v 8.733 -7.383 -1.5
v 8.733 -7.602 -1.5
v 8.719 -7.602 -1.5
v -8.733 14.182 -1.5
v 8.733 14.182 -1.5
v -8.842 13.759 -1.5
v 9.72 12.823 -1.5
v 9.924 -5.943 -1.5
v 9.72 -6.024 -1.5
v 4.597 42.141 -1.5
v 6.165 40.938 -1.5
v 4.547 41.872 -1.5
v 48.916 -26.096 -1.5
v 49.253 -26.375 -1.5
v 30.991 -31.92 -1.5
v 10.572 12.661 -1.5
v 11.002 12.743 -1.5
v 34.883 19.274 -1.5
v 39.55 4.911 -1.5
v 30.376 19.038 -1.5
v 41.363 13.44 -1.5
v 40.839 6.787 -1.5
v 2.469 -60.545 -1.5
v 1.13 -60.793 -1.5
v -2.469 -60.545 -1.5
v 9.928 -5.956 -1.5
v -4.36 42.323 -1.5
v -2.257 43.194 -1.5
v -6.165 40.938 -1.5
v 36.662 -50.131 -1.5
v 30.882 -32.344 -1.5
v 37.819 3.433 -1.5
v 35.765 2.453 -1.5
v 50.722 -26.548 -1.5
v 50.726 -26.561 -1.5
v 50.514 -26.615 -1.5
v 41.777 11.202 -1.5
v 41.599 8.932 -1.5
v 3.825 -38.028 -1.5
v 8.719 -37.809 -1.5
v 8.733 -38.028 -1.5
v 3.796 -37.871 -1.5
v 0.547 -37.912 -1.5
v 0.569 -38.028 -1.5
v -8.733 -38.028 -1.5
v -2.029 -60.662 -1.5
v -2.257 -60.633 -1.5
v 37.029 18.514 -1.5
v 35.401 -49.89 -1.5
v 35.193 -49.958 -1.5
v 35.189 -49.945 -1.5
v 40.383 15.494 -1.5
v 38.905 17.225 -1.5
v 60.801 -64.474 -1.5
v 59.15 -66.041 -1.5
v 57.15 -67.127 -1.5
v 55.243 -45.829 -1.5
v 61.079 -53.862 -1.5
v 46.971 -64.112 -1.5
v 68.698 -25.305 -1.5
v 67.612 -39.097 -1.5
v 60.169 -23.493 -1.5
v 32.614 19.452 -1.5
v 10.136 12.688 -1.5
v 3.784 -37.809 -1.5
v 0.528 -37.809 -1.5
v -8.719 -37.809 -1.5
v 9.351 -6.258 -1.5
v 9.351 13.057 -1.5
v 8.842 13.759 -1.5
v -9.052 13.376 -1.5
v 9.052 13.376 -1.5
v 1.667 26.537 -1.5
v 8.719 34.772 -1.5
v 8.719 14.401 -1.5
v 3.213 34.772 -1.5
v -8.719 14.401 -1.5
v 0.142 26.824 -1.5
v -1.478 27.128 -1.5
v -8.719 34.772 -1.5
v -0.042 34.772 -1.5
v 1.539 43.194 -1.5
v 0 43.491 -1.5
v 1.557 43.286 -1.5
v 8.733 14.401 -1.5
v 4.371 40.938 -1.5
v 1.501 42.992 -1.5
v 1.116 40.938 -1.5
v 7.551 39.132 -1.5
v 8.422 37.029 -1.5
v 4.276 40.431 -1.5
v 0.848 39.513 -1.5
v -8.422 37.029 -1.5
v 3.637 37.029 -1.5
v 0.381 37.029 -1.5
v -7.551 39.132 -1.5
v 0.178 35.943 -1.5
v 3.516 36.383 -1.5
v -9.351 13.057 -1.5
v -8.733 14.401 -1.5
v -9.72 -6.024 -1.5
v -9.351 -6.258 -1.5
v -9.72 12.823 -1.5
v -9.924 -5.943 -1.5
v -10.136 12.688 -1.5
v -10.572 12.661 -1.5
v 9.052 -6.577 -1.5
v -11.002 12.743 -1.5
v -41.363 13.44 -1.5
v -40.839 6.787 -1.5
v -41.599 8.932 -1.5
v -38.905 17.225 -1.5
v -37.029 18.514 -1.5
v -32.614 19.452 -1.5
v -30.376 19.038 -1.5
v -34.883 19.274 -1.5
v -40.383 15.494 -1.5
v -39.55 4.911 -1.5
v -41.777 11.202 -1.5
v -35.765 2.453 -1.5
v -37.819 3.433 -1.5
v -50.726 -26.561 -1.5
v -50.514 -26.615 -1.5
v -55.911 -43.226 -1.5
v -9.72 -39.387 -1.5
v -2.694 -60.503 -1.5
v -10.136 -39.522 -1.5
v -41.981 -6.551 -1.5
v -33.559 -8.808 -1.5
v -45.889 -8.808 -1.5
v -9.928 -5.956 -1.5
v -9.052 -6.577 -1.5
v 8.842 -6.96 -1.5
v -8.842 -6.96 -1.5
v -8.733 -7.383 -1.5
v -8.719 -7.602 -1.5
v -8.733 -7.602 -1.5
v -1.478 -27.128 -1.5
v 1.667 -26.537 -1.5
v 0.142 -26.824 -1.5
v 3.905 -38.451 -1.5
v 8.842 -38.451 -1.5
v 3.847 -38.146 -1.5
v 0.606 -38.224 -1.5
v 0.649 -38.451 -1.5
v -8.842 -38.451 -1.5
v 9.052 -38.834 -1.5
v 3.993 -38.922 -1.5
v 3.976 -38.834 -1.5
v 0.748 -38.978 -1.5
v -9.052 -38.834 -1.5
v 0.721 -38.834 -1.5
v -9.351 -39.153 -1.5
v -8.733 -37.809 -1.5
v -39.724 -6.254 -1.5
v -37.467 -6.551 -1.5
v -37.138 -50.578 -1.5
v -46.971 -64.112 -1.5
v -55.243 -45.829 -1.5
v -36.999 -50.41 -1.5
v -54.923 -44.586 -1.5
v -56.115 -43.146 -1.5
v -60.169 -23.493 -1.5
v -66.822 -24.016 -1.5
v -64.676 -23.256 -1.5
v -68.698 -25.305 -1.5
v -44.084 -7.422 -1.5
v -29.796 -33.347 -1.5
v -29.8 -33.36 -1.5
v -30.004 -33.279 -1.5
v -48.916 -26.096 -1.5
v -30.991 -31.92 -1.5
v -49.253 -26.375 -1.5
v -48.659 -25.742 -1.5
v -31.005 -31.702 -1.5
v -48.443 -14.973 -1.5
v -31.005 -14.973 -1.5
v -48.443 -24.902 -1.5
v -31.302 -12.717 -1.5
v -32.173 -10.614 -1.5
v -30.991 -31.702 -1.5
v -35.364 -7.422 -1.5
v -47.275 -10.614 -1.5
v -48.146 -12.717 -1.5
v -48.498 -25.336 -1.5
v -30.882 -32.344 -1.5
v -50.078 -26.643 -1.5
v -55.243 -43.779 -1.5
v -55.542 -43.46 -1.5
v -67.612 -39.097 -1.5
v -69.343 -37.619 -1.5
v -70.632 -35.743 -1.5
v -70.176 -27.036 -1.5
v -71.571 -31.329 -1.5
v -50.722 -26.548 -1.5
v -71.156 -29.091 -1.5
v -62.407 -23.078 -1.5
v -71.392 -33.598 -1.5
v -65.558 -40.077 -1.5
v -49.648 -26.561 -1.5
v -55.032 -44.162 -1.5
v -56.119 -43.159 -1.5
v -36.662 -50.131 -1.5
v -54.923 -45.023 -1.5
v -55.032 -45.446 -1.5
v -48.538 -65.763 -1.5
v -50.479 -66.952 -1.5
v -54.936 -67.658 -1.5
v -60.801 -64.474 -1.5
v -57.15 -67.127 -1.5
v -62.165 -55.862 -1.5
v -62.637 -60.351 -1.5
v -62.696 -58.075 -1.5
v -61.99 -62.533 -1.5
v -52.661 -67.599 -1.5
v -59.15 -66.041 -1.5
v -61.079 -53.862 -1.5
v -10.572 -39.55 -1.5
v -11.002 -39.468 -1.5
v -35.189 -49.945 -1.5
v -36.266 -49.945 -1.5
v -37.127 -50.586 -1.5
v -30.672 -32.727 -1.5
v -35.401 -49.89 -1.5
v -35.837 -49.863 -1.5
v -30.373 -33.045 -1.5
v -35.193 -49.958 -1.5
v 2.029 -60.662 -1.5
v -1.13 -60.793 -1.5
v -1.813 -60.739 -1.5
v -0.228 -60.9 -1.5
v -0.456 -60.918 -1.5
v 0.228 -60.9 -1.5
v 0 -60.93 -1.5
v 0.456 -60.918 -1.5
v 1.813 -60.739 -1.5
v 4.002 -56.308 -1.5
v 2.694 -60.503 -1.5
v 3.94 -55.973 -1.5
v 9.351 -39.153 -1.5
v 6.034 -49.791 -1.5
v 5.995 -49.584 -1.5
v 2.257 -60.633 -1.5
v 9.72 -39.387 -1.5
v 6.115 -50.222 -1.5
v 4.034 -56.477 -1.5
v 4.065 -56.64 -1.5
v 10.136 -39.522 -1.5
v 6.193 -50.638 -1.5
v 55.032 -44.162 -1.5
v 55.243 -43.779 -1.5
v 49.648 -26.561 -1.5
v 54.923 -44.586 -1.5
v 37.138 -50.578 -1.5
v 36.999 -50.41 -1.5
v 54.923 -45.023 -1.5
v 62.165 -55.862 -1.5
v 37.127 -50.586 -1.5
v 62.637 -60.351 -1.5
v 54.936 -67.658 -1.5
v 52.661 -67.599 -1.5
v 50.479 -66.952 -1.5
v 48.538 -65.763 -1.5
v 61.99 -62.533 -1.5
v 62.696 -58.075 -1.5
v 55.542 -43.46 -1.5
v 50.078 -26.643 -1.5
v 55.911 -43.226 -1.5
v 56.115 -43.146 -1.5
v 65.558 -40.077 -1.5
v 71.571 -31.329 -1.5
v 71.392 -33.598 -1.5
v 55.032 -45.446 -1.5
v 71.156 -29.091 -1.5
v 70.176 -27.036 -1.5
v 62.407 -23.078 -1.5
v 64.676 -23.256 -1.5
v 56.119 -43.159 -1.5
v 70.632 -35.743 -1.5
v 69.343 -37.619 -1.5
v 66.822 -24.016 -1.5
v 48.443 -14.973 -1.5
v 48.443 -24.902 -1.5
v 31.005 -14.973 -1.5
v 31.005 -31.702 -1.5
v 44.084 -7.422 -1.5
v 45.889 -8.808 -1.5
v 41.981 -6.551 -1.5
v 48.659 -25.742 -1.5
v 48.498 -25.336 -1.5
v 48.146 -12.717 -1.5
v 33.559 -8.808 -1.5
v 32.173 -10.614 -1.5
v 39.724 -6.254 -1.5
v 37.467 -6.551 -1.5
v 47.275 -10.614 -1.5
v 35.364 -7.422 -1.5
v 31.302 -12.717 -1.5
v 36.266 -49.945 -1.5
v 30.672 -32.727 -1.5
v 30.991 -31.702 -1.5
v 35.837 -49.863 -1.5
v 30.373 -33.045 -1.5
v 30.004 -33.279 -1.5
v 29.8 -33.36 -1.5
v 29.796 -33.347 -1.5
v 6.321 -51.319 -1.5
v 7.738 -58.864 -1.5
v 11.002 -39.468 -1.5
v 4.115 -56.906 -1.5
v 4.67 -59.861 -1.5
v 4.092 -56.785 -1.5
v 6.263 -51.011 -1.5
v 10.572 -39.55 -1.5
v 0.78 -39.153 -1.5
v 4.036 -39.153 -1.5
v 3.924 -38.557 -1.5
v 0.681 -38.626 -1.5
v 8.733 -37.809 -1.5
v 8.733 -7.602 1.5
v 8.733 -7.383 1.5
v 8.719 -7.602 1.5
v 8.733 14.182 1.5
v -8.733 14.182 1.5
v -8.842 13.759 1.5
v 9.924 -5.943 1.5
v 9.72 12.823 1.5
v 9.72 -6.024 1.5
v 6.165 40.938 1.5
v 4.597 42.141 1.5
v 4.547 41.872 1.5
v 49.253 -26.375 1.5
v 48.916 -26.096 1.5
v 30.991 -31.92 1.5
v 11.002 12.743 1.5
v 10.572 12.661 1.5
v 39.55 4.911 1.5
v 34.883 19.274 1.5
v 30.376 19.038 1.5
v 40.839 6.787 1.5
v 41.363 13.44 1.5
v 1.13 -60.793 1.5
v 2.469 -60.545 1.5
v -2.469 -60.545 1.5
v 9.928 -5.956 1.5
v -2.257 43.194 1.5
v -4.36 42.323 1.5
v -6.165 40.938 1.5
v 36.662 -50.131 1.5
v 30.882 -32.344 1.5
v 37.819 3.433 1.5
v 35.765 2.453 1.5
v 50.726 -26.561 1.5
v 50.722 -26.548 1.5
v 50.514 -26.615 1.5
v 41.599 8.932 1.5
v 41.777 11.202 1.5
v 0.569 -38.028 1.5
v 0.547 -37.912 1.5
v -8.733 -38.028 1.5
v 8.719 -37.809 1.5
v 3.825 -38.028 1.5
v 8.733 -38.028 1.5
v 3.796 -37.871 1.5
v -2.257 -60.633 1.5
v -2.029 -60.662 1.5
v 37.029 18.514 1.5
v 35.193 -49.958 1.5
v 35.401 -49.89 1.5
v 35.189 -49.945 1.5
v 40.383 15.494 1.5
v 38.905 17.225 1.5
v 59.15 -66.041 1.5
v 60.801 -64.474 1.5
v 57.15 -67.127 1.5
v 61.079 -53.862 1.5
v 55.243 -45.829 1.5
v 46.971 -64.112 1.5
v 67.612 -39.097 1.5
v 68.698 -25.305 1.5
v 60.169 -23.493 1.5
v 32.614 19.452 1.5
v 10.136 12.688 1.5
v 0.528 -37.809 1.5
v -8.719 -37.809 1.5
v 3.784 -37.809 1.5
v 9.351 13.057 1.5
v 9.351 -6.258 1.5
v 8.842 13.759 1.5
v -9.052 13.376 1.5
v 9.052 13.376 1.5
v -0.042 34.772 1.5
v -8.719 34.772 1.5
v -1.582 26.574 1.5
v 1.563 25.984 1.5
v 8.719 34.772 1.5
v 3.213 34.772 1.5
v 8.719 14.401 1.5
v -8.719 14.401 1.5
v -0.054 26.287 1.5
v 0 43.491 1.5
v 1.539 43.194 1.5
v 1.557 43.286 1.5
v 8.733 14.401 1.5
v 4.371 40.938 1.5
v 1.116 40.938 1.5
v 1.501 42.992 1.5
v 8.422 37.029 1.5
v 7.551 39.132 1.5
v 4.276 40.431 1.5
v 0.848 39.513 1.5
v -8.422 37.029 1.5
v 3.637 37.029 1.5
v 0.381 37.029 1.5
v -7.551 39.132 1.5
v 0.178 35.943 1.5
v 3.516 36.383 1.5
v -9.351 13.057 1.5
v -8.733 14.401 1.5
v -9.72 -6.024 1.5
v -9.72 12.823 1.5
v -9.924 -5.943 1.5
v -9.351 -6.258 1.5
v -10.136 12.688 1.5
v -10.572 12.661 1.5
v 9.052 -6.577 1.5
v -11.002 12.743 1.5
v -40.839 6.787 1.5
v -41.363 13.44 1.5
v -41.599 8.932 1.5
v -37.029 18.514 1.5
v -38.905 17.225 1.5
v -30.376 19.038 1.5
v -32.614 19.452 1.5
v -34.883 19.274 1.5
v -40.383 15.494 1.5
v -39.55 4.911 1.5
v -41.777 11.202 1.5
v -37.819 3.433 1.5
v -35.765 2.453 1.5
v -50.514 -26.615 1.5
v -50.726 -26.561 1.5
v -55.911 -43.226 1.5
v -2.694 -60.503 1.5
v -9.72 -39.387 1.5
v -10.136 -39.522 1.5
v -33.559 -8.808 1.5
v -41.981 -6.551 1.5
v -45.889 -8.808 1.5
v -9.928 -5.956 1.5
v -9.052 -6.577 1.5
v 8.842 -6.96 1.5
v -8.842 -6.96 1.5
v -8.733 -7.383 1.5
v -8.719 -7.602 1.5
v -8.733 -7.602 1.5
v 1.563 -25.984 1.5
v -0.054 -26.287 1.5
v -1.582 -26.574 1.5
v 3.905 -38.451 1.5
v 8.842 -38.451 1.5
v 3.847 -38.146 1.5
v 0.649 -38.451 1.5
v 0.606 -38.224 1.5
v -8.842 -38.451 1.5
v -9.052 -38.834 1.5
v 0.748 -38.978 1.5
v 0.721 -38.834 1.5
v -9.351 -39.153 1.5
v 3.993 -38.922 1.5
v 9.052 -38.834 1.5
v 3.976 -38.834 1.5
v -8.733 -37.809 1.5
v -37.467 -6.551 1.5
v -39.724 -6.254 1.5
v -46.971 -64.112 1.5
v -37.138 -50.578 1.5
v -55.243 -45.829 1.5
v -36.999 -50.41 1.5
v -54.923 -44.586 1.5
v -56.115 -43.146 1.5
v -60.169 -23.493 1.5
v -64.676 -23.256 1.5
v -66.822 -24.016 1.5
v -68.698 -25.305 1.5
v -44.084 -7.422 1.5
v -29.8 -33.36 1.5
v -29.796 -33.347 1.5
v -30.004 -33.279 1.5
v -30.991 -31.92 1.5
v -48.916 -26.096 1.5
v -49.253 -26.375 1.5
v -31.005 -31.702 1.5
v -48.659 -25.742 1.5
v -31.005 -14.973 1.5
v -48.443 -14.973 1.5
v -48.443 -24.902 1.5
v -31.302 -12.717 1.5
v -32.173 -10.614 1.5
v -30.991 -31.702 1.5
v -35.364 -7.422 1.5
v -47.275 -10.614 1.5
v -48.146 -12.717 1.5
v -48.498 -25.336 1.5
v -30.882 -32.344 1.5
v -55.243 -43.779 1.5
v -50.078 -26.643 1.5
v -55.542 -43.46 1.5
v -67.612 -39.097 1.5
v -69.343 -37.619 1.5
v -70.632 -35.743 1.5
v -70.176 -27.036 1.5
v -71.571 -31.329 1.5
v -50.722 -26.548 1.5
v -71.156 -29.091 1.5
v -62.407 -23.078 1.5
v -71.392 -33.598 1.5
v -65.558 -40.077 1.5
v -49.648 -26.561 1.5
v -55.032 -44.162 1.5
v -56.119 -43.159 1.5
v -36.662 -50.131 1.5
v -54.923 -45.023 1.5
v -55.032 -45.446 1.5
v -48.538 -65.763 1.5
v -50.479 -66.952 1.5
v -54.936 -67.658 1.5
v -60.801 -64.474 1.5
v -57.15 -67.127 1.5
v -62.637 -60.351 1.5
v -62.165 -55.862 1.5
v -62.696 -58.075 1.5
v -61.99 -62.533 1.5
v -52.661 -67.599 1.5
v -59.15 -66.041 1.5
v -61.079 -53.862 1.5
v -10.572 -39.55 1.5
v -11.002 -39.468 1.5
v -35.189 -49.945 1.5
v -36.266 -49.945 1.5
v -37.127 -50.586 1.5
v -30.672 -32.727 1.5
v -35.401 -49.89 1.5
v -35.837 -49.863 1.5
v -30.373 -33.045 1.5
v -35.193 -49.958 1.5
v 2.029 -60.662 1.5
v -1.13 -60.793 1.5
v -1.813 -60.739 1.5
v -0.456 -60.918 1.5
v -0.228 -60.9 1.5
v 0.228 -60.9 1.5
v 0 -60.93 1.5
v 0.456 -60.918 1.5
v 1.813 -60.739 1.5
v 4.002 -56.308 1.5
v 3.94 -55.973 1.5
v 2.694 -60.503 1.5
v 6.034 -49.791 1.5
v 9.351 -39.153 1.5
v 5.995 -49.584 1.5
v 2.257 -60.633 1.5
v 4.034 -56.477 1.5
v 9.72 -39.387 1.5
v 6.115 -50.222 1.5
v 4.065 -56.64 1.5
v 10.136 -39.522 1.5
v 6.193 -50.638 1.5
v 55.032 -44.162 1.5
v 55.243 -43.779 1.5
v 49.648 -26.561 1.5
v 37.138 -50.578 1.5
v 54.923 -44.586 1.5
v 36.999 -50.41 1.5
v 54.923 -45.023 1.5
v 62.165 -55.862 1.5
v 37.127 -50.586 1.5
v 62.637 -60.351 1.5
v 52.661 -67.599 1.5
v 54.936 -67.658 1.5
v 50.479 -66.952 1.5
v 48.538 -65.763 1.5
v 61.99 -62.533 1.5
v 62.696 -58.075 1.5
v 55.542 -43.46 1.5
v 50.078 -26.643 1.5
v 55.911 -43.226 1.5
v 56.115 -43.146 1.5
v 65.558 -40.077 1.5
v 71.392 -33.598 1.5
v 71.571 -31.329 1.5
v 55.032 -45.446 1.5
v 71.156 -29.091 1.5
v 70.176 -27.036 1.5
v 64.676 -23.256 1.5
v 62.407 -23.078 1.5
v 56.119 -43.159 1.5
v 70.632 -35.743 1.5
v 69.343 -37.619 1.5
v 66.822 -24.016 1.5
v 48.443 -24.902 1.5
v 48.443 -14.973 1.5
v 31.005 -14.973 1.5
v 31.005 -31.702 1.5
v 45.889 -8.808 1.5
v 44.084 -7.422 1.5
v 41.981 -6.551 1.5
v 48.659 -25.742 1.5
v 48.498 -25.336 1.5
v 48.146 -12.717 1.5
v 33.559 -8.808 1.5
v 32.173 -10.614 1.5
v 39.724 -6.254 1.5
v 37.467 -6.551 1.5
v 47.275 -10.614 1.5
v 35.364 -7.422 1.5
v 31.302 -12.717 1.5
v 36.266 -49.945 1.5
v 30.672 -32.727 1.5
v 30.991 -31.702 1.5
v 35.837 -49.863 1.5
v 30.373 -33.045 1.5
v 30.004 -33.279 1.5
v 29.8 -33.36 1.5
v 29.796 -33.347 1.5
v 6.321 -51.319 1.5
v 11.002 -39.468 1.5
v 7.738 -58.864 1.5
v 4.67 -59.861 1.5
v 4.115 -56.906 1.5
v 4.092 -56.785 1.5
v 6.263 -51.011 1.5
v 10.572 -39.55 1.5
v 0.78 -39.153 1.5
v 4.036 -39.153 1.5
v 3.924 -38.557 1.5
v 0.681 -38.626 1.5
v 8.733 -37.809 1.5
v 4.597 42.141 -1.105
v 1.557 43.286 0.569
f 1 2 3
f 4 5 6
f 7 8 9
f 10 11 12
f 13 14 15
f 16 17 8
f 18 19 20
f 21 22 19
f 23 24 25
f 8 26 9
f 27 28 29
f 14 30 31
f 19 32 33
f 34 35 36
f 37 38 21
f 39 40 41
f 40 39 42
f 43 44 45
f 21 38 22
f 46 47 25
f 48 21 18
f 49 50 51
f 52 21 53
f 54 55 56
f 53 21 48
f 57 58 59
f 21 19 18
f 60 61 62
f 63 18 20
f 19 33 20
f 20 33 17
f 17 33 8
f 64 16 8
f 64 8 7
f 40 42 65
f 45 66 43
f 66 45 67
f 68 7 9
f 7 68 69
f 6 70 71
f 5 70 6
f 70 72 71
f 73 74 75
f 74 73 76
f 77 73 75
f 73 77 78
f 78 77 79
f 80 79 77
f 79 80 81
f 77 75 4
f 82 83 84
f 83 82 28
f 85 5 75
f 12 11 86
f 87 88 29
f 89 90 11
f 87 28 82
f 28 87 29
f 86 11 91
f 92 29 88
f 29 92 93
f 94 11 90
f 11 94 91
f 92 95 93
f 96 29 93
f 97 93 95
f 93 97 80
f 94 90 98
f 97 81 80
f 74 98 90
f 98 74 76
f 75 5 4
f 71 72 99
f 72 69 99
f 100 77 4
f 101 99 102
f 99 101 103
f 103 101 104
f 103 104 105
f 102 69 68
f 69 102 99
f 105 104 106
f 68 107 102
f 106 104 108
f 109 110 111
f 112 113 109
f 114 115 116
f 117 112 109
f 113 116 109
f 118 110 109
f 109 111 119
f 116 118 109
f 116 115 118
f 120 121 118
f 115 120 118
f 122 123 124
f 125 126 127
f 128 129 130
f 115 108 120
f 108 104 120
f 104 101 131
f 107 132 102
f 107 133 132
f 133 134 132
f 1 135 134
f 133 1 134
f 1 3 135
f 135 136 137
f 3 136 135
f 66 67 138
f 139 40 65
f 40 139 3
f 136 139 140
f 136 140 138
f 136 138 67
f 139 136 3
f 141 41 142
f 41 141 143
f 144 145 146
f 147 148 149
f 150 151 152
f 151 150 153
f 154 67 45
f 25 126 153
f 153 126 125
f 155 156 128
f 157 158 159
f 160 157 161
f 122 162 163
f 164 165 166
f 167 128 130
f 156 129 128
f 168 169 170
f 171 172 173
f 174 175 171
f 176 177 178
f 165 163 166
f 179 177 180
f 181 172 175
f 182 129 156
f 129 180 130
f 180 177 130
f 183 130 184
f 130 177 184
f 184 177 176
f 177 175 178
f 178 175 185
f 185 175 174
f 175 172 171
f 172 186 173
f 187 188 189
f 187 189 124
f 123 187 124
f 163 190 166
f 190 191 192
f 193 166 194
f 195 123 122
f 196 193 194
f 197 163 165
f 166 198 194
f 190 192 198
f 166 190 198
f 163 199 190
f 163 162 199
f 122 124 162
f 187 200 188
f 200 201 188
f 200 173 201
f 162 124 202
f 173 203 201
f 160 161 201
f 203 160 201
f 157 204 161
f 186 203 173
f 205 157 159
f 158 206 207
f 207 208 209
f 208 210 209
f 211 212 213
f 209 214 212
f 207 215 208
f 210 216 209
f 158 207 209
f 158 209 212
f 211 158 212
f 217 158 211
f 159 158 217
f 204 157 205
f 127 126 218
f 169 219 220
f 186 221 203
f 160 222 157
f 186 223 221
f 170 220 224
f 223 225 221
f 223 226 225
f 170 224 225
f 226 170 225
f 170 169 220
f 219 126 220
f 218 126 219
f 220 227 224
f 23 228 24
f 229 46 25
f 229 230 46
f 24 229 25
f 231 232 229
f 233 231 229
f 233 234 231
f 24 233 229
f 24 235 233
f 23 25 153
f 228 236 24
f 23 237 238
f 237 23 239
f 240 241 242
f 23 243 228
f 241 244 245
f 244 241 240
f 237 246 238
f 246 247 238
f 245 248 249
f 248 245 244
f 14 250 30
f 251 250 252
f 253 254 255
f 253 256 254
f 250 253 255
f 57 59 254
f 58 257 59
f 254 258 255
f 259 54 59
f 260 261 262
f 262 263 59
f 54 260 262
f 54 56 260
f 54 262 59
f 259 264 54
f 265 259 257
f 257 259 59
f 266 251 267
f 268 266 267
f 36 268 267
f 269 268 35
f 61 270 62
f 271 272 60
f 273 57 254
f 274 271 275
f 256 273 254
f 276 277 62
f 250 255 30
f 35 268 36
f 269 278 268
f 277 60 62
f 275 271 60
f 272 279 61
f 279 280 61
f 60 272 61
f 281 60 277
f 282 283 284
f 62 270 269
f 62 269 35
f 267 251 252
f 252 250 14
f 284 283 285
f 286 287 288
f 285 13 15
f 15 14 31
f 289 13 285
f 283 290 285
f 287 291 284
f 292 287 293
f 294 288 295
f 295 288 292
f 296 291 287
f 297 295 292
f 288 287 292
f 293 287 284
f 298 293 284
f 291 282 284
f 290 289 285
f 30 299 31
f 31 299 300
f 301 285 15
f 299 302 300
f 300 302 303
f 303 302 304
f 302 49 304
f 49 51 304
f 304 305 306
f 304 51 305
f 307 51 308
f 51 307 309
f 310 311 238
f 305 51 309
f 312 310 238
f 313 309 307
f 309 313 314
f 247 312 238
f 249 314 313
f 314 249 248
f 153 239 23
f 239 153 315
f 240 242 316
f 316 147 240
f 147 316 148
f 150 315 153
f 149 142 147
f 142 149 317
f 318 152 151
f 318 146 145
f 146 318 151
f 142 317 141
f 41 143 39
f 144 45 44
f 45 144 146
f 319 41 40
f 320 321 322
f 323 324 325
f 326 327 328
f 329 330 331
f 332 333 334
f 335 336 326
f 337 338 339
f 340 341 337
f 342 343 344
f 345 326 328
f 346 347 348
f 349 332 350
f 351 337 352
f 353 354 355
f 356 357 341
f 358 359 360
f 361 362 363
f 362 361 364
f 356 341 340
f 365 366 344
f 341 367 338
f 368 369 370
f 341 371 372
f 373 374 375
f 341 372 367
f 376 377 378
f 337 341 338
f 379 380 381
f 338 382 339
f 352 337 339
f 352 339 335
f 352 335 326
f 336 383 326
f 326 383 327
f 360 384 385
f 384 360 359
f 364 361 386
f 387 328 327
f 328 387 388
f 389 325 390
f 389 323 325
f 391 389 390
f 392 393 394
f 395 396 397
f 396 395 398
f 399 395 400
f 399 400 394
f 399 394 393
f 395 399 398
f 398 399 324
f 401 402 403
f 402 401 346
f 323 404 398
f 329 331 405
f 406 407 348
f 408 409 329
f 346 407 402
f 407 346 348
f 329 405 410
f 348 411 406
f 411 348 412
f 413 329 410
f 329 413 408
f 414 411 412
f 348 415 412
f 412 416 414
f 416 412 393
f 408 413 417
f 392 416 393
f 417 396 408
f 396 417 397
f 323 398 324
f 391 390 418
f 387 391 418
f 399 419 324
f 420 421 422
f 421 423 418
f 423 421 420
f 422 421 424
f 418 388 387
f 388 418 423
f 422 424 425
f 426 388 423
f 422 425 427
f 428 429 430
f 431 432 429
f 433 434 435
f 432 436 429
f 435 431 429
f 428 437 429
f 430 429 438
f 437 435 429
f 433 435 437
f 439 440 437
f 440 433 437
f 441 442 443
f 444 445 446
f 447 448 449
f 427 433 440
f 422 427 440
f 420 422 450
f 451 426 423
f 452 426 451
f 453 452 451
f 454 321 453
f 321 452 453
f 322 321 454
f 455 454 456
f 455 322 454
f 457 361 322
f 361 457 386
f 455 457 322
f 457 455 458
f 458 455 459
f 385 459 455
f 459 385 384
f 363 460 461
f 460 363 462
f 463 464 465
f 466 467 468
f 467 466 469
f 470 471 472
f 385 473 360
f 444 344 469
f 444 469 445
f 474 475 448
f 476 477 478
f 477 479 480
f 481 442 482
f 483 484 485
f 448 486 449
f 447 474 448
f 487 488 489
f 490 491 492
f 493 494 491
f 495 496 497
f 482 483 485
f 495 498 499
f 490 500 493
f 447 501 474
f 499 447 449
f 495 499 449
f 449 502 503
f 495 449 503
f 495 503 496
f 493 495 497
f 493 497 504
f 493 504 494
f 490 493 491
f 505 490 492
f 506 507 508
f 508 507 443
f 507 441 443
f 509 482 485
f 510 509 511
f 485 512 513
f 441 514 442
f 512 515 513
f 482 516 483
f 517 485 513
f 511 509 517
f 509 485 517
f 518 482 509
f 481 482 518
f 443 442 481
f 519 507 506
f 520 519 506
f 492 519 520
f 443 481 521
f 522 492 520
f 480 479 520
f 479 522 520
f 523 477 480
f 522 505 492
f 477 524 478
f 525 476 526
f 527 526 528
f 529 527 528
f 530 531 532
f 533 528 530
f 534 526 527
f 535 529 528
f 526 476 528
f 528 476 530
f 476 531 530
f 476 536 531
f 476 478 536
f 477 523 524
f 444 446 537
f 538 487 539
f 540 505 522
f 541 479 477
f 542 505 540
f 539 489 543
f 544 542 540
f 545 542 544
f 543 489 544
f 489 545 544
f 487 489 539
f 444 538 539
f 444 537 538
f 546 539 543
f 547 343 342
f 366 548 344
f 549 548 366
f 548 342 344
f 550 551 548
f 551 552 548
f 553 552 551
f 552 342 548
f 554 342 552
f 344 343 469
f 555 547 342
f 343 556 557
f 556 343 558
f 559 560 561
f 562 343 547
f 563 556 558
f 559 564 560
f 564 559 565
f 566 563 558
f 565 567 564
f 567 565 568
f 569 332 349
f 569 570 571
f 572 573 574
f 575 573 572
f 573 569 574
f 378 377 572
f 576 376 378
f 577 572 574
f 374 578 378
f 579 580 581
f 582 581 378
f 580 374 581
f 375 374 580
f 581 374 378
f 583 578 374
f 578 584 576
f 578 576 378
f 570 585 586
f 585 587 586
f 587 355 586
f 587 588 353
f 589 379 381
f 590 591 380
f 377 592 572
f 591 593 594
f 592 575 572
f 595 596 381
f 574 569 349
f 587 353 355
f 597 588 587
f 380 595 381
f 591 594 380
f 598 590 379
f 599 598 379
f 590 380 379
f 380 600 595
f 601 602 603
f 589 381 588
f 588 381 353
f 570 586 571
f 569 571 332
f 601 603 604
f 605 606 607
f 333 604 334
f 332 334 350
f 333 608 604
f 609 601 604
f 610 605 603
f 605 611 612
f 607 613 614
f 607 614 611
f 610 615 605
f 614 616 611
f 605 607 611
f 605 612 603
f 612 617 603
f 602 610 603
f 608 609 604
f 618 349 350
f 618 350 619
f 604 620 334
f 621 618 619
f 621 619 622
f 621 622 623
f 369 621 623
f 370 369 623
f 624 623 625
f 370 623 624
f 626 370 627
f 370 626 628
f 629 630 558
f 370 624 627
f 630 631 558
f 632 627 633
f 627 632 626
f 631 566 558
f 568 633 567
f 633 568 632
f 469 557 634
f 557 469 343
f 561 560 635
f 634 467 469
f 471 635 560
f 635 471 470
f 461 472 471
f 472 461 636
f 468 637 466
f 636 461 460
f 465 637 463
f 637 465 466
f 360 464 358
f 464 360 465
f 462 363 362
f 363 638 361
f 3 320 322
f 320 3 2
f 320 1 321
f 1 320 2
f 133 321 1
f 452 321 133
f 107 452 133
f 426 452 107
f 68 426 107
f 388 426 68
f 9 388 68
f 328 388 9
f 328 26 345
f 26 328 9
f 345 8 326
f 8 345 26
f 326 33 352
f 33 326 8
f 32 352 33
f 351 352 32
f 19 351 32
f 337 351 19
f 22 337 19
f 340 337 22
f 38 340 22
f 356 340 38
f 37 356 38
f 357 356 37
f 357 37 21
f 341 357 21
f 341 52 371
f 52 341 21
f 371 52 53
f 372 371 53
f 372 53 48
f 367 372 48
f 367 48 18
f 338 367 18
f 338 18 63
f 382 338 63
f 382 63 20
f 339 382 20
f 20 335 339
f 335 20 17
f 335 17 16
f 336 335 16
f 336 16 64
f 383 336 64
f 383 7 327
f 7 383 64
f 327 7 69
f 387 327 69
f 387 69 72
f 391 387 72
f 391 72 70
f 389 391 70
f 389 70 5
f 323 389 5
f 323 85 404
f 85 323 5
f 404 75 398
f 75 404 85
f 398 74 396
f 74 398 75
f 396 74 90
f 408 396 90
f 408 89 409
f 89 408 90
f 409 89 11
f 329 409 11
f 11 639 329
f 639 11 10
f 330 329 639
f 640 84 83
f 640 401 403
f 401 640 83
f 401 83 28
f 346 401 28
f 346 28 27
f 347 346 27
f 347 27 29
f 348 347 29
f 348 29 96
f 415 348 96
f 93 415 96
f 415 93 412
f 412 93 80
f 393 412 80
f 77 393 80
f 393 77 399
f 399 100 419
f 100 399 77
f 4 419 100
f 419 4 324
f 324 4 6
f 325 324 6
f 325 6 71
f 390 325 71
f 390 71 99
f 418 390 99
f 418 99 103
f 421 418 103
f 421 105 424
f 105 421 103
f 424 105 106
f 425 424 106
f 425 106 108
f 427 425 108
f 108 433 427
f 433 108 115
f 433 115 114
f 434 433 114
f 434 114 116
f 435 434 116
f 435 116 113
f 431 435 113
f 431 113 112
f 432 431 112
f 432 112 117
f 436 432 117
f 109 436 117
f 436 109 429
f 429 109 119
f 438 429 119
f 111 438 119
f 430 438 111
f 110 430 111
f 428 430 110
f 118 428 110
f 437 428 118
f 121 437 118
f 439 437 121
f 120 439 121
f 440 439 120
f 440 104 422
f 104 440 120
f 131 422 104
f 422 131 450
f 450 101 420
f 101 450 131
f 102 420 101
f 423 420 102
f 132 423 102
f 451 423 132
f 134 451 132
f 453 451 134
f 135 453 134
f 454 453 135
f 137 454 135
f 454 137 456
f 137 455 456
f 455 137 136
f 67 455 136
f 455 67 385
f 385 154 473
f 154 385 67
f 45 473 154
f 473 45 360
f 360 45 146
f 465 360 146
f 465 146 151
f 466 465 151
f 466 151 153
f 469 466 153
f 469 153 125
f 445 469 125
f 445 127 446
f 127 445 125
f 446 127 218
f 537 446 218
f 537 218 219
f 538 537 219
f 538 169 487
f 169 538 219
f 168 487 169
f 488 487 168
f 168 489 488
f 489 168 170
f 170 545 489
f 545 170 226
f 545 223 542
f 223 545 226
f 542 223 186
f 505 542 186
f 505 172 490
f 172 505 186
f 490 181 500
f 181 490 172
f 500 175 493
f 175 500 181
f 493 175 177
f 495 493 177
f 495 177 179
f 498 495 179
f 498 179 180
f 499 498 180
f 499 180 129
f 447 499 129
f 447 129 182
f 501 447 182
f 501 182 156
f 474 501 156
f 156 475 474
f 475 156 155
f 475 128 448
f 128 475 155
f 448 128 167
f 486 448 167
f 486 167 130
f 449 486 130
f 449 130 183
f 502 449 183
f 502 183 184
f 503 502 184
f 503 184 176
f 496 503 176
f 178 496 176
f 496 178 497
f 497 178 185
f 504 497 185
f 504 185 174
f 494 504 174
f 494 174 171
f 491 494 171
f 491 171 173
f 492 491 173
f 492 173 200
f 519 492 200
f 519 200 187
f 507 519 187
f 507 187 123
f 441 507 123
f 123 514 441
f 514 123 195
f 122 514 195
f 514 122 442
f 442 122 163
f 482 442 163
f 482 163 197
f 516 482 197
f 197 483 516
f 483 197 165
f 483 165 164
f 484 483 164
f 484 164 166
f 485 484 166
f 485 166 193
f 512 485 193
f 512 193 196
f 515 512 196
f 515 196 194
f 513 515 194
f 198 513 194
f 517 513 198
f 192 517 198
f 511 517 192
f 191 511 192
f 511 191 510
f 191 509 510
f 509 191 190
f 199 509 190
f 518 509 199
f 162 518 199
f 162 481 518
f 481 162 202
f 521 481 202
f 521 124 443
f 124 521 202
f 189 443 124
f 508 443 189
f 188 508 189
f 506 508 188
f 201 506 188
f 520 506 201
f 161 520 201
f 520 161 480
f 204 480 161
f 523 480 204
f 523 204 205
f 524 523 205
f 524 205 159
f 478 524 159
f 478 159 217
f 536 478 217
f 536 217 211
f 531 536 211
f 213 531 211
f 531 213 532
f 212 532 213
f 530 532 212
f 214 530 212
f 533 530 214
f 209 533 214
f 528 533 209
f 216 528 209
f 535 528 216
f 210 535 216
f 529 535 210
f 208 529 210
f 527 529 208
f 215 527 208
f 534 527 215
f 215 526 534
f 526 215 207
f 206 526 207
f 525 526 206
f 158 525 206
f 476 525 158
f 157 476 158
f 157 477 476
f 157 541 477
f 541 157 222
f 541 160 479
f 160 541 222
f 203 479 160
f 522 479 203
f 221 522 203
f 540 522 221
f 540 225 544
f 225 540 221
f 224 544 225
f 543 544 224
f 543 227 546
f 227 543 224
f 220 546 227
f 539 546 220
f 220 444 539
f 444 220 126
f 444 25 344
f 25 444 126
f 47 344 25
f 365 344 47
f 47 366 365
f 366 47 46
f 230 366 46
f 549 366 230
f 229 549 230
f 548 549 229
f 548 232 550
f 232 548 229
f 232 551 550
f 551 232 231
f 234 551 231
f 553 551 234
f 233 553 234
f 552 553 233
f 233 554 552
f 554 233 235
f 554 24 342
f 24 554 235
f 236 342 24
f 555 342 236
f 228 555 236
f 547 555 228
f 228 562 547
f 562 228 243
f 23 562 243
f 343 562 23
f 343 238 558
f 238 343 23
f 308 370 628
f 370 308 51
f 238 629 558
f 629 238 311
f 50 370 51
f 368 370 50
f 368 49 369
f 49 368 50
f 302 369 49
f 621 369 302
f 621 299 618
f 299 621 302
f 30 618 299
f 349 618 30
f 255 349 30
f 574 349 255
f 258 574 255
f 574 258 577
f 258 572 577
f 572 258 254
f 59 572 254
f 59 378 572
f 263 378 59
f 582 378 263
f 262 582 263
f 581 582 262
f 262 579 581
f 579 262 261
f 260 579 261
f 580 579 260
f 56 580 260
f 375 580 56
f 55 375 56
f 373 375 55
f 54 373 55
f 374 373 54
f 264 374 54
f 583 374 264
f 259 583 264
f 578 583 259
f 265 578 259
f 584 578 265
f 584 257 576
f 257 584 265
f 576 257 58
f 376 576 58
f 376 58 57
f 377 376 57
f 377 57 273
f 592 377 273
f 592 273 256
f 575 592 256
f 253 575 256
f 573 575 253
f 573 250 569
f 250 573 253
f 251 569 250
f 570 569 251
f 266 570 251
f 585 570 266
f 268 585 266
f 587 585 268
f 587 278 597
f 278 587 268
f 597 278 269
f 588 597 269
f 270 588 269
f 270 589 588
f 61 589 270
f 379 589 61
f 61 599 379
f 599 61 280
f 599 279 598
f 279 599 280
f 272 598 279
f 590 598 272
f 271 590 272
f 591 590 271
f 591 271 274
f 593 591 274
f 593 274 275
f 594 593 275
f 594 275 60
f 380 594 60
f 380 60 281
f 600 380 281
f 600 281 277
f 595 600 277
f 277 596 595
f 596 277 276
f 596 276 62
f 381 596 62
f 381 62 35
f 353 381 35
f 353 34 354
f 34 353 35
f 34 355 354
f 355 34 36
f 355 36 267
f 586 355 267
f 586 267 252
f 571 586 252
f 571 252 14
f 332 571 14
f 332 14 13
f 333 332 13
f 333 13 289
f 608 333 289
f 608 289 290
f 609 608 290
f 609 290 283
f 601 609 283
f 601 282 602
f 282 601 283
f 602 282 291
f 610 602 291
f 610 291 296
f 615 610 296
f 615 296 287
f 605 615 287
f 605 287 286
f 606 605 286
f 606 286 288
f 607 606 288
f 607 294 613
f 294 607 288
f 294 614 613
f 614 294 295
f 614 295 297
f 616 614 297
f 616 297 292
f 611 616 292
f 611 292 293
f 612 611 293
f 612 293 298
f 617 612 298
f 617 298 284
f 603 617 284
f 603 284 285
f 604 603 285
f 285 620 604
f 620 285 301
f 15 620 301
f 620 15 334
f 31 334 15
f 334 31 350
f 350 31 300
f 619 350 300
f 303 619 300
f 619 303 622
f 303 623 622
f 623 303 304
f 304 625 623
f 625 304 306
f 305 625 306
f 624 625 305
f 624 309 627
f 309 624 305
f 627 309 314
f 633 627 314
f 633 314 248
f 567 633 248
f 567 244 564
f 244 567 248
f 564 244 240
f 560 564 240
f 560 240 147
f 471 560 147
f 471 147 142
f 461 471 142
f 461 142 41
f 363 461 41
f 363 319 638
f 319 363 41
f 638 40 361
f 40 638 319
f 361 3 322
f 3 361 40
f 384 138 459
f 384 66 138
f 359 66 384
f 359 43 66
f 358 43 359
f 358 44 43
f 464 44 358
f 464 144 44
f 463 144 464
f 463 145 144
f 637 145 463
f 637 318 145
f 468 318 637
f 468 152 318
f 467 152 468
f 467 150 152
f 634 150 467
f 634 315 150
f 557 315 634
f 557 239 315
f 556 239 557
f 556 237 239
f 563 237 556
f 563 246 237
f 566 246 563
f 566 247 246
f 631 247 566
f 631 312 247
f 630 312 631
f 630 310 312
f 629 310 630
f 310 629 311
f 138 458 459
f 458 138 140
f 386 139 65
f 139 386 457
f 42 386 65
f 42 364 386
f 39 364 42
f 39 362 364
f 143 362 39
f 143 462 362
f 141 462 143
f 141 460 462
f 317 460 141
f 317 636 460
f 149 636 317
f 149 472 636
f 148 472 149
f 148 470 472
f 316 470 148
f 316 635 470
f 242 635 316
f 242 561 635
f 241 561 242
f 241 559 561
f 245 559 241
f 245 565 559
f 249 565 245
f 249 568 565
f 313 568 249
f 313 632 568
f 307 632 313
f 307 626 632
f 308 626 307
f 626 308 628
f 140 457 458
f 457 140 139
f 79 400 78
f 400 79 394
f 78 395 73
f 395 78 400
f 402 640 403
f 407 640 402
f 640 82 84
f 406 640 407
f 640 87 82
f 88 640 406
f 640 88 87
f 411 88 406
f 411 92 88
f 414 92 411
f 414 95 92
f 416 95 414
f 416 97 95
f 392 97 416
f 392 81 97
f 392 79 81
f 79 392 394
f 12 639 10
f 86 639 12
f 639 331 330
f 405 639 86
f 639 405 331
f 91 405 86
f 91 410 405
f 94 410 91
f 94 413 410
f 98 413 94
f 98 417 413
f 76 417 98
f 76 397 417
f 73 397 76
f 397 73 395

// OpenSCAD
// Customizable Xmas Wreath
// by Stellar Innovation
// http://www.thingiverse.com/stellarinnovation/about
// licensed under the Creative Commons - Attribution license. 

wreathRadius = 200;   // [150:500]
numTwigs = 24;        // [10:2:50]
thickness = 3.0;      // [1:0.1:6.0]
// displays entire wreath (warning: very slow!)
show_assembled = "no"; // [yes,no]

rotationStep = 360/numTwigs;
rollAngle = atan2(1, sqrt(cos(rotationStep)));
twigLength = 2*wreathRadius*sin(rotationStep)/sin((180-rotationStep)/2);
twigThickness = 3*thickness;

tol=0.1*1;

if (show_assembled == "yes")
  wreathPart();
else
  twigPart();

// One piece, of which numTwigs are needed to form a wreath
module twigPart() {
    rotate([0, -rollAngle])
    translate([wreathRadius, 0])
    difference() {
        twig3D(twigLength, rollAngle, 0);

        // diagonal slot at base of the twig
        rotate(rotationStep)
          translate([-wreathRadius, 0])
            rotate([0, -rollAngle])
              cube([twigLength, twigLength/2, thickness+2*tol], center=true); 
        
        // slot at tip of twig
        rotate(-rotationStep)
          translate([-wreathRadius, 0])
            rotate([0, -rollAngle])
              cube([twigLength, twigLength/2, thickness+2*tol], center=true); 
    }
}

// Complete wreath
module wreathPart() {
    for (i=[0:numTwigs-1]) {
      twig3D(twigLength, 
              (2*floor(i/2) == i)? -rollAngle : rollAngle, 
              i*rotationStep);
    }
}

// twig without slot with given length, roll (around its  own axis) and 
// rotation around z-axis (rotZ)
module twig3D(length, roll, rotZ) {
   width = max(0.167*length, 3*thickness);
    
   rotate(rotZ)
     translate([-wreathRadius, 0])
       rotate([0, roll])
         translate([0, -length/2, -thickness/2])
           linear_extrude(height=thickness)
             level3Twig2D(length, width);
}

// 2D version of twig (all 9 branches)
module level3Twig2D(length, width) {
  l1 = 0.8*length;
  max_fillet = (l1-2.1*width)/0.73;
    
  level2Twig2D(length, width);
  rotate(72)
    level2Twig2D(l1, width);
  rotate(-72)
    level2Twig2D(l1, width);

  if (max_fillet > 0)
    upper_fillets(width, max_fillet);
}

// 2D twig with just three branches
module level2Twig2D(length, width) {
  h2 = 0.5*length;
  l2 = 0.5*length;
  max_upper_fillet = (length-l2-1.7*width)/0.73;
  max_lower_fillet = (length-l2-1.4*width)/0.73;
    
  basicTwig2D(length, width);
    
  translate([0, h2]) {
    rotate(72)
      basicTwig2D(l2, width);
    rotate(-72)
      basicTwig2D(l2, width);

    if (max_upper_fillet > 0)
      upper_fillets(width, max_upper_fillet);
    if (max_lower_fillet > 0)
      lower_fillets(width, max_lower_fillet);
  }
}

// 2D twig, a single branch
module basicTwig2D(length, width) {
    r = width/2;
    circle(d=width, $fn=24);
    translate([-r, 0])
      square([width, length-width]);
    translate([0, length-width])
      circle(d=width, $fn=24);
}


// "upper" fillets (the acute, 72 degree angles) 
module upper_fillets(width, max_fillet) {
  r_fillet = min(5, 0.1*width, max_fillet);
  dx = 0.5*width;
  dy1 = dx*tan(18);
  dy2 = dx/cos(18);
  
  translate([dx, dy1+dy2])
    fillet2D(72, r_fillet);
  mirror([1, 0])
    translate([dx, dy1+dy2])
      fillet2D(72, r_fillet);
}

// "lower" fillets (the obtuse, 108 degree angles)
module lower_fillets(width, max_fillet) {
  r_fillet = min(5, 0.1*width, max_fillet);
  dx = 0.5*width;
  dy1 = dx*tan(18);
  dy2 = dx/cos(18);
  
  translate([dx, dy1-dy2])
    mirror([0, 1])
      fillet2D(108, r_fillet);
  mirror([1, 0])
    translate([dx, dy1-dy2])
      mirror([0, 1])
        fillet2D(108, r_fillet);
}

// fills in a fillet of an angle
module fillet2D(angle, radius) {
    dy = radius/tan(angle/2);
    x1 = dy*cos(90-angle);
    y1 = dy*sin(90-angle);
    
    difference() {
        polygon([[0, 0], [0,dy], [radius,dy], [x1,y1]]);
        
        translate([radius, dy])
          circle(r=radius, $fn=25);
    }
} 
